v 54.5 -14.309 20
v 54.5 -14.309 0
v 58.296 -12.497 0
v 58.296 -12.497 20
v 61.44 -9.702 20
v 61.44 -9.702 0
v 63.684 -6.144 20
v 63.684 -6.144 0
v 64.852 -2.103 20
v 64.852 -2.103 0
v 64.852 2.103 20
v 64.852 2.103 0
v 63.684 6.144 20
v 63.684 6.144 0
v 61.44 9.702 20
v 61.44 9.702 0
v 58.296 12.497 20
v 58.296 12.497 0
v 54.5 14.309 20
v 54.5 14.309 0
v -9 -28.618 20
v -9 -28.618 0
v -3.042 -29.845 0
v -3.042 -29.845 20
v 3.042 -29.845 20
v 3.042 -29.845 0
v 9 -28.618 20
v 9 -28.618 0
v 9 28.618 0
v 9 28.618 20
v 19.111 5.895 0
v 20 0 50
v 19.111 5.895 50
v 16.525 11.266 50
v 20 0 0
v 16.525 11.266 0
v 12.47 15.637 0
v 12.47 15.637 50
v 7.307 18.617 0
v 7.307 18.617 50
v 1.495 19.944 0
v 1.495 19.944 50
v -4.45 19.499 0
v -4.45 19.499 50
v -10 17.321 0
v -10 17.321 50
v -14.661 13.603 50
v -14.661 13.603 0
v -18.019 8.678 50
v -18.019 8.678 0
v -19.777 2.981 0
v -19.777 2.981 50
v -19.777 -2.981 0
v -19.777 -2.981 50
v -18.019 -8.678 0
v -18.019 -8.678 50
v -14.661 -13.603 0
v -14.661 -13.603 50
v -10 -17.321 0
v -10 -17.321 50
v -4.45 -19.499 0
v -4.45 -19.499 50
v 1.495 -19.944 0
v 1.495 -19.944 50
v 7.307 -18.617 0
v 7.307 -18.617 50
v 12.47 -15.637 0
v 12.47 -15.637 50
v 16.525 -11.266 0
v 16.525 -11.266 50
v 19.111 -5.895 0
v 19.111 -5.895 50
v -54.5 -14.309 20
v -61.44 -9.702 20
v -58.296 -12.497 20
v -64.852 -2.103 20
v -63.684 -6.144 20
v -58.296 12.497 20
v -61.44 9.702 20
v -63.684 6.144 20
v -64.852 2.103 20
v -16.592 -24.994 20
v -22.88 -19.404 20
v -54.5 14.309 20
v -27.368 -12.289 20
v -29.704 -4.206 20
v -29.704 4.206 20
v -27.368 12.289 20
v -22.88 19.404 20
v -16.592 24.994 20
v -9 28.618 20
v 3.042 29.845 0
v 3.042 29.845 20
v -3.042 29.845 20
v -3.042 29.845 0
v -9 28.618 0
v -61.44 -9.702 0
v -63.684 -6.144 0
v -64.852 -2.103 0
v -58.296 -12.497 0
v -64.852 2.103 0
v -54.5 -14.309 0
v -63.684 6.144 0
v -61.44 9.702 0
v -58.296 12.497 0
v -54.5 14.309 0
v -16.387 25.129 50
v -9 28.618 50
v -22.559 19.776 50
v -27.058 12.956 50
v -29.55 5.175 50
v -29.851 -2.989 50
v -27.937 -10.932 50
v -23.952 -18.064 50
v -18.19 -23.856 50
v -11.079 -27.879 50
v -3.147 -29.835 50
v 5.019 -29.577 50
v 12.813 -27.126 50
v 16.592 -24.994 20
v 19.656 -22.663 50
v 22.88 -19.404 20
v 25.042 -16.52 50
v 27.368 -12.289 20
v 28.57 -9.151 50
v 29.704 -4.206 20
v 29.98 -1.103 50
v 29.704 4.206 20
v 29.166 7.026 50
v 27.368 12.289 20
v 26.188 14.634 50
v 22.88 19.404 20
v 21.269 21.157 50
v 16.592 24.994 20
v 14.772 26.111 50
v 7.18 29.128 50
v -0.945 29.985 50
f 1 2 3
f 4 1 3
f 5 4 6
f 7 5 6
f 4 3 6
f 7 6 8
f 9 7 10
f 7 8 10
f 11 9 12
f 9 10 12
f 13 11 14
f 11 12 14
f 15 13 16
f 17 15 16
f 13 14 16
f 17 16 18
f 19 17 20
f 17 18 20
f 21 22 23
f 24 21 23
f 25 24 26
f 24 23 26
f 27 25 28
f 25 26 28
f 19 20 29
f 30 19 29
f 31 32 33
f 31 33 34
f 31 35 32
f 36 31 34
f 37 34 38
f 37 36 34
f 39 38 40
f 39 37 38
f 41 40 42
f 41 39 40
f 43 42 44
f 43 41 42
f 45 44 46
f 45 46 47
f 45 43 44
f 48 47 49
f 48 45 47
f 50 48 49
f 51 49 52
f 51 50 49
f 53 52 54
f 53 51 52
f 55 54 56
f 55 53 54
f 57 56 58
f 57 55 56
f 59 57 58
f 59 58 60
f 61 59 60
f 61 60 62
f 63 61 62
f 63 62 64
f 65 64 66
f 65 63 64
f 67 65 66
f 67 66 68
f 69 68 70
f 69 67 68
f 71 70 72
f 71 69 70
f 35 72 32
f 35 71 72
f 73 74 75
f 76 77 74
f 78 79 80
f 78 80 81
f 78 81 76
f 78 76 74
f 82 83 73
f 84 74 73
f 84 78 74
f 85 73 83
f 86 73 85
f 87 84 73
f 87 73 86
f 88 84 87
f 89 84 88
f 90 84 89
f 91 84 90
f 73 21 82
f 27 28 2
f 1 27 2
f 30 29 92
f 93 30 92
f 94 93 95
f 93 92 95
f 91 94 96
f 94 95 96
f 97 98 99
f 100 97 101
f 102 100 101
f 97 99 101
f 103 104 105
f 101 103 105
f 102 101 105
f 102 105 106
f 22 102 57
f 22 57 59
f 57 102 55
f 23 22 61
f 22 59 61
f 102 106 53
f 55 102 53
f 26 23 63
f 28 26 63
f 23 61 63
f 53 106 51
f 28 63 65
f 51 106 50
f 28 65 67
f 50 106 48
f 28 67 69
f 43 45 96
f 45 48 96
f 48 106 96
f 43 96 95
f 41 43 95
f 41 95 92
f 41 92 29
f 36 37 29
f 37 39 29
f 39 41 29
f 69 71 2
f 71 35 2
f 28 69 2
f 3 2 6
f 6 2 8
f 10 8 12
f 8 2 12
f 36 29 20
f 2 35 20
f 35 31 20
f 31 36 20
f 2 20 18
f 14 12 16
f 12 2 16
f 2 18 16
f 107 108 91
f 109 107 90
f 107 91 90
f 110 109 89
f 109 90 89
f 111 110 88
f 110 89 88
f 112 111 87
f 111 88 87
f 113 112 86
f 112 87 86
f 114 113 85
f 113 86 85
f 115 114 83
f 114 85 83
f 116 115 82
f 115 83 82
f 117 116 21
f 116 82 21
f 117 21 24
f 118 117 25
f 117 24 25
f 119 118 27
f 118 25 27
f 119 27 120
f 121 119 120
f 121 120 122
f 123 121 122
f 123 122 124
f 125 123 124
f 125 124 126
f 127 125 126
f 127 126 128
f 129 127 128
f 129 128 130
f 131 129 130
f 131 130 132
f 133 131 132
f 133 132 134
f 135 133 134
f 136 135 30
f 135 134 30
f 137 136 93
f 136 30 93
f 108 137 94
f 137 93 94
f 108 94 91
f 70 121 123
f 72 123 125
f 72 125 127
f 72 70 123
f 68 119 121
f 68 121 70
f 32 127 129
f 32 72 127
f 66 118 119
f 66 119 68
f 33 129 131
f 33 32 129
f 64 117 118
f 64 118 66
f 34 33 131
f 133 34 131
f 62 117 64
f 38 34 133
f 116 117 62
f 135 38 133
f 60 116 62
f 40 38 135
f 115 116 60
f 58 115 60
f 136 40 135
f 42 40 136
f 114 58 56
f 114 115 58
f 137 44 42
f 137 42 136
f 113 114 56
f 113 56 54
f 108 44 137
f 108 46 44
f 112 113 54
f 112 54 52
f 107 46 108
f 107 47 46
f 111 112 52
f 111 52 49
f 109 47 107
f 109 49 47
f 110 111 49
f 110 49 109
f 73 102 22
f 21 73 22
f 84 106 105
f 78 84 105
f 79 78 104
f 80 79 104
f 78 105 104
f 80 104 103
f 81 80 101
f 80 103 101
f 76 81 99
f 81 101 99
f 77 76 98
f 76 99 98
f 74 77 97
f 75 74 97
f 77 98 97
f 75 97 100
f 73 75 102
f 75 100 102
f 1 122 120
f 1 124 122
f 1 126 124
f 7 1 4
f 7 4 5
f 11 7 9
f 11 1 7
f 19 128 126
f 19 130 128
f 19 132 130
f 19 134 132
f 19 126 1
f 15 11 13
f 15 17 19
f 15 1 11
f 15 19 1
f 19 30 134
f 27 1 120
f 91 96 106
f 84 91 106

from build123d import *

# Parameters (mm, degrees)
SKETCH1_R           = 20
BOSS_EXTRUDE1_DEPTH = 20
SKETCH2_R           = 30
SKETCH2_R_2         = 20
BOSS_EXTRUDE2_DEPTH = 30


with BuildPart() as part:
    # Sketch1 → Boss-Extrude1 (new body)
    with BuildSketch(Plane.XY):
        with BuildLine():
            Line((-9, 28.618176043), (-54.5, 14.309088021))
            ThreePointArc((-54.5, 14.309088021), (-65, 0), (-54.5, -14.309088021))
            Line((-54.5, -14.309088021), (-9, -28.618176043))
            ThreePointArc((-9, -28.618176043), (0, -30), (9, -28.618176043))
            Line((9, -28.618176043), (54.5, -14.309088021))
            ThreePointArc((54.5, -14.309088021), (65, 0), (54.5, 14.309088021))
            Line((54.5, 14.309088021), (9, 28.618176043))
            ThreePointArc((9, 28.618176043), (0, 30), (-9, 28.618176043))
        make_face()
        Circle(SKETCH1_R, mode=Mode.SUBTRACT)
    extrude(amount=BOSS_EXTRUDE1_DEPTH)

    # Sketch2 → Boss-Extrude2 (add)
    with BuildSketch(Plane.XY.offset(20)):
        with Locations(Location((0, 0, 0), (0, 0, 107.457603124))):
            Circle(SKETCH2_R)
        Circle(SKETCH2_R_2, mode=Mode.SUBTRACT)
    extrude(amount=BOSS_EXTRUDE2_DEPTH)


solid = part.part
